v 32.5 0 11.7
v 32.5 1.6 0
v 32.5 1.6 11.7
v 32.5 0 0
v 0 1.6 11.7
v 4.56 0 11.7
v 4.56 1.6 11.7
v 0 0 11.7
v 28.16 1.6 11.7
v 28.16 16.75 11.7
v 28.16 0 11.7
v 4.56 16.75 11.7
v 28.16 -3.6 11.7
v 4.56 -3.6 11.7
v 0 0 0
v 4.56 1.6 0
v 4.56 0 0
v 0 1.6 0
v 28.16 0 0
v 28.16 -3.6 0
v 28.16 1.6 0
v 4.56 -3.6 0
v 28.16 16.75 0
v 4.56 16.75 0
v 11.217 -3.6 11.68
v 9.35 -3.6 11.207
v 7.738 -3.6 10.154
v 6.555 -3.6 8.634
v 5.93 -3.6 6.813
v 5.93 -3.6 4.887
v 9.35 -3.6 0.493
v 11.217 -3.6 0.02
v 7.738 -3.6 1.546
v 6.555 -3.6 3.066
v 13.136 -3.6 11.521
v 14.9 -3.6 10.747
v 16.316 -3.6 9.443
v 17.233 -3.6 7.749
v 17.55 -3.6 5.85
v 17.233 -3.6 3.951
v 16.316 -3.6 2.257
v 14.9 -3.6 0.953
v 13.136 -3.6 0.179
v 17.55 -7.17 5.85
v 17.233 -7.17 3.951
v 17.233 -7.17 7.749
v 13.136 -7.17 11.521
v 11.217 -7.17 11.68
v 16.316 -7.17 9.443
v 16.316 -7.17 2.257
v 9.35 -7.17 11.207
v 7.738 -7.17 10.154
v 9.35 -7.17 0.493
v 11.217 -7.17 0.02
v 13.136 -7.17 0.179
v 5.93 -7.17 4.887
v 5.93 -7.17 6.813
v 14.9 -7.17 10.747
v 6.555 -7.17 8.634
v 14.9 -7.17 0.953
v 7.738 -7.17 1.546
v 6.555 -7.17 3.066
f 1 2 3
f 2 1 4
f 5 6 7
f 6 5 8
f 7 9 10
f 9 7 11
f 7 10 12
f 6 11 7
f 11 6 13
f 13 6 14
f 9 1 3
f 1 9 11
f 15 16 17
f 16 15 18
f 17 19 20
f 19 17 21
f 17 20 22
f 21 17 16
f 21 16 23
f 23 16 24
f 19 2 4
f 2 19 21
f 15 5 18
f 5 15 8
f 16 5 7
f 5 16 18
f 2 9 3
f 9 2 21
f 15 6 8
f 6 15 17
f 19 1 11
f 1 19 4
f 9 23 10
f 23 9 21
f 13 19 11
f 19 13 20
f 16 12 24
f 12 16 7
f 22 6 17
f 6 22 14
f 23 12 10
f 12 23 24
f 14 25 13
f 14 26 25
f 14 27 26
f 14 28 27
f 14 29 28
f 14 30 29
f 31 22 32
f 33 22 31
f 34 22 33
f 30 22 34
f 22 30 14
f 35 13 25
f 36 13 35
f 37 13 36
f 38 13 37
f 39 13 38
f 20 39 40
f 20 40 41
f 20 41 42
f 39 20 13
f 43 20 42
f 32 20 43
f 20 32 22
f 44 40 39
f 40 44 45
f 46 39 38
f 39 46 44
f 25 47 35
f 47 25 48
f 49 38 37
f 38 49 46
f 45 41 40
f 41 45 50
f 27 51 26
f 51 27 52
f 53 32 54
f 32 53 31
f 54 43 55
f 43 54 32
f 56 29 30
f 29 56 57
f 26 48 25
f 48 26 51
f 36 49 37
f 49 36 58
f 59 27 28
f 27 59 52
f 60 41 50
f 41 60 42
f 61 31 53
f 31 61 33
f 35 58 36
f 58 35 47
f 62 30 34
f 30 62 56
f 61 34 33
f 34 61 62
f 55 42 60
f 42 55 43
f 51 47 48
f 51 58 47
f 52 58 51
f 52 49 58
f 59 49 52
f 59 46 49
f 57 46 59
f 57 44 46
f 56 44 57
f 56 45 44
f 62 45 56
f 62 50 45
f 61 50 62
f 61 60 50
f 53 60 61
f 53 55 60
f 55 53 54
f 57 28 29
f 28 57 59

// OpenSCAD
cube([32.5, 1.6, 11.7]);
translate([4.56, -3.6, 0])
cube([23.6, 20.35, 11.7]);

color("red")
translate([11.7, 0, 5.85])
rotate([90,0,00])
//cylinder height is 7.17, diameter is 11.7
cylinder(h= 7.17, d=11.7);
